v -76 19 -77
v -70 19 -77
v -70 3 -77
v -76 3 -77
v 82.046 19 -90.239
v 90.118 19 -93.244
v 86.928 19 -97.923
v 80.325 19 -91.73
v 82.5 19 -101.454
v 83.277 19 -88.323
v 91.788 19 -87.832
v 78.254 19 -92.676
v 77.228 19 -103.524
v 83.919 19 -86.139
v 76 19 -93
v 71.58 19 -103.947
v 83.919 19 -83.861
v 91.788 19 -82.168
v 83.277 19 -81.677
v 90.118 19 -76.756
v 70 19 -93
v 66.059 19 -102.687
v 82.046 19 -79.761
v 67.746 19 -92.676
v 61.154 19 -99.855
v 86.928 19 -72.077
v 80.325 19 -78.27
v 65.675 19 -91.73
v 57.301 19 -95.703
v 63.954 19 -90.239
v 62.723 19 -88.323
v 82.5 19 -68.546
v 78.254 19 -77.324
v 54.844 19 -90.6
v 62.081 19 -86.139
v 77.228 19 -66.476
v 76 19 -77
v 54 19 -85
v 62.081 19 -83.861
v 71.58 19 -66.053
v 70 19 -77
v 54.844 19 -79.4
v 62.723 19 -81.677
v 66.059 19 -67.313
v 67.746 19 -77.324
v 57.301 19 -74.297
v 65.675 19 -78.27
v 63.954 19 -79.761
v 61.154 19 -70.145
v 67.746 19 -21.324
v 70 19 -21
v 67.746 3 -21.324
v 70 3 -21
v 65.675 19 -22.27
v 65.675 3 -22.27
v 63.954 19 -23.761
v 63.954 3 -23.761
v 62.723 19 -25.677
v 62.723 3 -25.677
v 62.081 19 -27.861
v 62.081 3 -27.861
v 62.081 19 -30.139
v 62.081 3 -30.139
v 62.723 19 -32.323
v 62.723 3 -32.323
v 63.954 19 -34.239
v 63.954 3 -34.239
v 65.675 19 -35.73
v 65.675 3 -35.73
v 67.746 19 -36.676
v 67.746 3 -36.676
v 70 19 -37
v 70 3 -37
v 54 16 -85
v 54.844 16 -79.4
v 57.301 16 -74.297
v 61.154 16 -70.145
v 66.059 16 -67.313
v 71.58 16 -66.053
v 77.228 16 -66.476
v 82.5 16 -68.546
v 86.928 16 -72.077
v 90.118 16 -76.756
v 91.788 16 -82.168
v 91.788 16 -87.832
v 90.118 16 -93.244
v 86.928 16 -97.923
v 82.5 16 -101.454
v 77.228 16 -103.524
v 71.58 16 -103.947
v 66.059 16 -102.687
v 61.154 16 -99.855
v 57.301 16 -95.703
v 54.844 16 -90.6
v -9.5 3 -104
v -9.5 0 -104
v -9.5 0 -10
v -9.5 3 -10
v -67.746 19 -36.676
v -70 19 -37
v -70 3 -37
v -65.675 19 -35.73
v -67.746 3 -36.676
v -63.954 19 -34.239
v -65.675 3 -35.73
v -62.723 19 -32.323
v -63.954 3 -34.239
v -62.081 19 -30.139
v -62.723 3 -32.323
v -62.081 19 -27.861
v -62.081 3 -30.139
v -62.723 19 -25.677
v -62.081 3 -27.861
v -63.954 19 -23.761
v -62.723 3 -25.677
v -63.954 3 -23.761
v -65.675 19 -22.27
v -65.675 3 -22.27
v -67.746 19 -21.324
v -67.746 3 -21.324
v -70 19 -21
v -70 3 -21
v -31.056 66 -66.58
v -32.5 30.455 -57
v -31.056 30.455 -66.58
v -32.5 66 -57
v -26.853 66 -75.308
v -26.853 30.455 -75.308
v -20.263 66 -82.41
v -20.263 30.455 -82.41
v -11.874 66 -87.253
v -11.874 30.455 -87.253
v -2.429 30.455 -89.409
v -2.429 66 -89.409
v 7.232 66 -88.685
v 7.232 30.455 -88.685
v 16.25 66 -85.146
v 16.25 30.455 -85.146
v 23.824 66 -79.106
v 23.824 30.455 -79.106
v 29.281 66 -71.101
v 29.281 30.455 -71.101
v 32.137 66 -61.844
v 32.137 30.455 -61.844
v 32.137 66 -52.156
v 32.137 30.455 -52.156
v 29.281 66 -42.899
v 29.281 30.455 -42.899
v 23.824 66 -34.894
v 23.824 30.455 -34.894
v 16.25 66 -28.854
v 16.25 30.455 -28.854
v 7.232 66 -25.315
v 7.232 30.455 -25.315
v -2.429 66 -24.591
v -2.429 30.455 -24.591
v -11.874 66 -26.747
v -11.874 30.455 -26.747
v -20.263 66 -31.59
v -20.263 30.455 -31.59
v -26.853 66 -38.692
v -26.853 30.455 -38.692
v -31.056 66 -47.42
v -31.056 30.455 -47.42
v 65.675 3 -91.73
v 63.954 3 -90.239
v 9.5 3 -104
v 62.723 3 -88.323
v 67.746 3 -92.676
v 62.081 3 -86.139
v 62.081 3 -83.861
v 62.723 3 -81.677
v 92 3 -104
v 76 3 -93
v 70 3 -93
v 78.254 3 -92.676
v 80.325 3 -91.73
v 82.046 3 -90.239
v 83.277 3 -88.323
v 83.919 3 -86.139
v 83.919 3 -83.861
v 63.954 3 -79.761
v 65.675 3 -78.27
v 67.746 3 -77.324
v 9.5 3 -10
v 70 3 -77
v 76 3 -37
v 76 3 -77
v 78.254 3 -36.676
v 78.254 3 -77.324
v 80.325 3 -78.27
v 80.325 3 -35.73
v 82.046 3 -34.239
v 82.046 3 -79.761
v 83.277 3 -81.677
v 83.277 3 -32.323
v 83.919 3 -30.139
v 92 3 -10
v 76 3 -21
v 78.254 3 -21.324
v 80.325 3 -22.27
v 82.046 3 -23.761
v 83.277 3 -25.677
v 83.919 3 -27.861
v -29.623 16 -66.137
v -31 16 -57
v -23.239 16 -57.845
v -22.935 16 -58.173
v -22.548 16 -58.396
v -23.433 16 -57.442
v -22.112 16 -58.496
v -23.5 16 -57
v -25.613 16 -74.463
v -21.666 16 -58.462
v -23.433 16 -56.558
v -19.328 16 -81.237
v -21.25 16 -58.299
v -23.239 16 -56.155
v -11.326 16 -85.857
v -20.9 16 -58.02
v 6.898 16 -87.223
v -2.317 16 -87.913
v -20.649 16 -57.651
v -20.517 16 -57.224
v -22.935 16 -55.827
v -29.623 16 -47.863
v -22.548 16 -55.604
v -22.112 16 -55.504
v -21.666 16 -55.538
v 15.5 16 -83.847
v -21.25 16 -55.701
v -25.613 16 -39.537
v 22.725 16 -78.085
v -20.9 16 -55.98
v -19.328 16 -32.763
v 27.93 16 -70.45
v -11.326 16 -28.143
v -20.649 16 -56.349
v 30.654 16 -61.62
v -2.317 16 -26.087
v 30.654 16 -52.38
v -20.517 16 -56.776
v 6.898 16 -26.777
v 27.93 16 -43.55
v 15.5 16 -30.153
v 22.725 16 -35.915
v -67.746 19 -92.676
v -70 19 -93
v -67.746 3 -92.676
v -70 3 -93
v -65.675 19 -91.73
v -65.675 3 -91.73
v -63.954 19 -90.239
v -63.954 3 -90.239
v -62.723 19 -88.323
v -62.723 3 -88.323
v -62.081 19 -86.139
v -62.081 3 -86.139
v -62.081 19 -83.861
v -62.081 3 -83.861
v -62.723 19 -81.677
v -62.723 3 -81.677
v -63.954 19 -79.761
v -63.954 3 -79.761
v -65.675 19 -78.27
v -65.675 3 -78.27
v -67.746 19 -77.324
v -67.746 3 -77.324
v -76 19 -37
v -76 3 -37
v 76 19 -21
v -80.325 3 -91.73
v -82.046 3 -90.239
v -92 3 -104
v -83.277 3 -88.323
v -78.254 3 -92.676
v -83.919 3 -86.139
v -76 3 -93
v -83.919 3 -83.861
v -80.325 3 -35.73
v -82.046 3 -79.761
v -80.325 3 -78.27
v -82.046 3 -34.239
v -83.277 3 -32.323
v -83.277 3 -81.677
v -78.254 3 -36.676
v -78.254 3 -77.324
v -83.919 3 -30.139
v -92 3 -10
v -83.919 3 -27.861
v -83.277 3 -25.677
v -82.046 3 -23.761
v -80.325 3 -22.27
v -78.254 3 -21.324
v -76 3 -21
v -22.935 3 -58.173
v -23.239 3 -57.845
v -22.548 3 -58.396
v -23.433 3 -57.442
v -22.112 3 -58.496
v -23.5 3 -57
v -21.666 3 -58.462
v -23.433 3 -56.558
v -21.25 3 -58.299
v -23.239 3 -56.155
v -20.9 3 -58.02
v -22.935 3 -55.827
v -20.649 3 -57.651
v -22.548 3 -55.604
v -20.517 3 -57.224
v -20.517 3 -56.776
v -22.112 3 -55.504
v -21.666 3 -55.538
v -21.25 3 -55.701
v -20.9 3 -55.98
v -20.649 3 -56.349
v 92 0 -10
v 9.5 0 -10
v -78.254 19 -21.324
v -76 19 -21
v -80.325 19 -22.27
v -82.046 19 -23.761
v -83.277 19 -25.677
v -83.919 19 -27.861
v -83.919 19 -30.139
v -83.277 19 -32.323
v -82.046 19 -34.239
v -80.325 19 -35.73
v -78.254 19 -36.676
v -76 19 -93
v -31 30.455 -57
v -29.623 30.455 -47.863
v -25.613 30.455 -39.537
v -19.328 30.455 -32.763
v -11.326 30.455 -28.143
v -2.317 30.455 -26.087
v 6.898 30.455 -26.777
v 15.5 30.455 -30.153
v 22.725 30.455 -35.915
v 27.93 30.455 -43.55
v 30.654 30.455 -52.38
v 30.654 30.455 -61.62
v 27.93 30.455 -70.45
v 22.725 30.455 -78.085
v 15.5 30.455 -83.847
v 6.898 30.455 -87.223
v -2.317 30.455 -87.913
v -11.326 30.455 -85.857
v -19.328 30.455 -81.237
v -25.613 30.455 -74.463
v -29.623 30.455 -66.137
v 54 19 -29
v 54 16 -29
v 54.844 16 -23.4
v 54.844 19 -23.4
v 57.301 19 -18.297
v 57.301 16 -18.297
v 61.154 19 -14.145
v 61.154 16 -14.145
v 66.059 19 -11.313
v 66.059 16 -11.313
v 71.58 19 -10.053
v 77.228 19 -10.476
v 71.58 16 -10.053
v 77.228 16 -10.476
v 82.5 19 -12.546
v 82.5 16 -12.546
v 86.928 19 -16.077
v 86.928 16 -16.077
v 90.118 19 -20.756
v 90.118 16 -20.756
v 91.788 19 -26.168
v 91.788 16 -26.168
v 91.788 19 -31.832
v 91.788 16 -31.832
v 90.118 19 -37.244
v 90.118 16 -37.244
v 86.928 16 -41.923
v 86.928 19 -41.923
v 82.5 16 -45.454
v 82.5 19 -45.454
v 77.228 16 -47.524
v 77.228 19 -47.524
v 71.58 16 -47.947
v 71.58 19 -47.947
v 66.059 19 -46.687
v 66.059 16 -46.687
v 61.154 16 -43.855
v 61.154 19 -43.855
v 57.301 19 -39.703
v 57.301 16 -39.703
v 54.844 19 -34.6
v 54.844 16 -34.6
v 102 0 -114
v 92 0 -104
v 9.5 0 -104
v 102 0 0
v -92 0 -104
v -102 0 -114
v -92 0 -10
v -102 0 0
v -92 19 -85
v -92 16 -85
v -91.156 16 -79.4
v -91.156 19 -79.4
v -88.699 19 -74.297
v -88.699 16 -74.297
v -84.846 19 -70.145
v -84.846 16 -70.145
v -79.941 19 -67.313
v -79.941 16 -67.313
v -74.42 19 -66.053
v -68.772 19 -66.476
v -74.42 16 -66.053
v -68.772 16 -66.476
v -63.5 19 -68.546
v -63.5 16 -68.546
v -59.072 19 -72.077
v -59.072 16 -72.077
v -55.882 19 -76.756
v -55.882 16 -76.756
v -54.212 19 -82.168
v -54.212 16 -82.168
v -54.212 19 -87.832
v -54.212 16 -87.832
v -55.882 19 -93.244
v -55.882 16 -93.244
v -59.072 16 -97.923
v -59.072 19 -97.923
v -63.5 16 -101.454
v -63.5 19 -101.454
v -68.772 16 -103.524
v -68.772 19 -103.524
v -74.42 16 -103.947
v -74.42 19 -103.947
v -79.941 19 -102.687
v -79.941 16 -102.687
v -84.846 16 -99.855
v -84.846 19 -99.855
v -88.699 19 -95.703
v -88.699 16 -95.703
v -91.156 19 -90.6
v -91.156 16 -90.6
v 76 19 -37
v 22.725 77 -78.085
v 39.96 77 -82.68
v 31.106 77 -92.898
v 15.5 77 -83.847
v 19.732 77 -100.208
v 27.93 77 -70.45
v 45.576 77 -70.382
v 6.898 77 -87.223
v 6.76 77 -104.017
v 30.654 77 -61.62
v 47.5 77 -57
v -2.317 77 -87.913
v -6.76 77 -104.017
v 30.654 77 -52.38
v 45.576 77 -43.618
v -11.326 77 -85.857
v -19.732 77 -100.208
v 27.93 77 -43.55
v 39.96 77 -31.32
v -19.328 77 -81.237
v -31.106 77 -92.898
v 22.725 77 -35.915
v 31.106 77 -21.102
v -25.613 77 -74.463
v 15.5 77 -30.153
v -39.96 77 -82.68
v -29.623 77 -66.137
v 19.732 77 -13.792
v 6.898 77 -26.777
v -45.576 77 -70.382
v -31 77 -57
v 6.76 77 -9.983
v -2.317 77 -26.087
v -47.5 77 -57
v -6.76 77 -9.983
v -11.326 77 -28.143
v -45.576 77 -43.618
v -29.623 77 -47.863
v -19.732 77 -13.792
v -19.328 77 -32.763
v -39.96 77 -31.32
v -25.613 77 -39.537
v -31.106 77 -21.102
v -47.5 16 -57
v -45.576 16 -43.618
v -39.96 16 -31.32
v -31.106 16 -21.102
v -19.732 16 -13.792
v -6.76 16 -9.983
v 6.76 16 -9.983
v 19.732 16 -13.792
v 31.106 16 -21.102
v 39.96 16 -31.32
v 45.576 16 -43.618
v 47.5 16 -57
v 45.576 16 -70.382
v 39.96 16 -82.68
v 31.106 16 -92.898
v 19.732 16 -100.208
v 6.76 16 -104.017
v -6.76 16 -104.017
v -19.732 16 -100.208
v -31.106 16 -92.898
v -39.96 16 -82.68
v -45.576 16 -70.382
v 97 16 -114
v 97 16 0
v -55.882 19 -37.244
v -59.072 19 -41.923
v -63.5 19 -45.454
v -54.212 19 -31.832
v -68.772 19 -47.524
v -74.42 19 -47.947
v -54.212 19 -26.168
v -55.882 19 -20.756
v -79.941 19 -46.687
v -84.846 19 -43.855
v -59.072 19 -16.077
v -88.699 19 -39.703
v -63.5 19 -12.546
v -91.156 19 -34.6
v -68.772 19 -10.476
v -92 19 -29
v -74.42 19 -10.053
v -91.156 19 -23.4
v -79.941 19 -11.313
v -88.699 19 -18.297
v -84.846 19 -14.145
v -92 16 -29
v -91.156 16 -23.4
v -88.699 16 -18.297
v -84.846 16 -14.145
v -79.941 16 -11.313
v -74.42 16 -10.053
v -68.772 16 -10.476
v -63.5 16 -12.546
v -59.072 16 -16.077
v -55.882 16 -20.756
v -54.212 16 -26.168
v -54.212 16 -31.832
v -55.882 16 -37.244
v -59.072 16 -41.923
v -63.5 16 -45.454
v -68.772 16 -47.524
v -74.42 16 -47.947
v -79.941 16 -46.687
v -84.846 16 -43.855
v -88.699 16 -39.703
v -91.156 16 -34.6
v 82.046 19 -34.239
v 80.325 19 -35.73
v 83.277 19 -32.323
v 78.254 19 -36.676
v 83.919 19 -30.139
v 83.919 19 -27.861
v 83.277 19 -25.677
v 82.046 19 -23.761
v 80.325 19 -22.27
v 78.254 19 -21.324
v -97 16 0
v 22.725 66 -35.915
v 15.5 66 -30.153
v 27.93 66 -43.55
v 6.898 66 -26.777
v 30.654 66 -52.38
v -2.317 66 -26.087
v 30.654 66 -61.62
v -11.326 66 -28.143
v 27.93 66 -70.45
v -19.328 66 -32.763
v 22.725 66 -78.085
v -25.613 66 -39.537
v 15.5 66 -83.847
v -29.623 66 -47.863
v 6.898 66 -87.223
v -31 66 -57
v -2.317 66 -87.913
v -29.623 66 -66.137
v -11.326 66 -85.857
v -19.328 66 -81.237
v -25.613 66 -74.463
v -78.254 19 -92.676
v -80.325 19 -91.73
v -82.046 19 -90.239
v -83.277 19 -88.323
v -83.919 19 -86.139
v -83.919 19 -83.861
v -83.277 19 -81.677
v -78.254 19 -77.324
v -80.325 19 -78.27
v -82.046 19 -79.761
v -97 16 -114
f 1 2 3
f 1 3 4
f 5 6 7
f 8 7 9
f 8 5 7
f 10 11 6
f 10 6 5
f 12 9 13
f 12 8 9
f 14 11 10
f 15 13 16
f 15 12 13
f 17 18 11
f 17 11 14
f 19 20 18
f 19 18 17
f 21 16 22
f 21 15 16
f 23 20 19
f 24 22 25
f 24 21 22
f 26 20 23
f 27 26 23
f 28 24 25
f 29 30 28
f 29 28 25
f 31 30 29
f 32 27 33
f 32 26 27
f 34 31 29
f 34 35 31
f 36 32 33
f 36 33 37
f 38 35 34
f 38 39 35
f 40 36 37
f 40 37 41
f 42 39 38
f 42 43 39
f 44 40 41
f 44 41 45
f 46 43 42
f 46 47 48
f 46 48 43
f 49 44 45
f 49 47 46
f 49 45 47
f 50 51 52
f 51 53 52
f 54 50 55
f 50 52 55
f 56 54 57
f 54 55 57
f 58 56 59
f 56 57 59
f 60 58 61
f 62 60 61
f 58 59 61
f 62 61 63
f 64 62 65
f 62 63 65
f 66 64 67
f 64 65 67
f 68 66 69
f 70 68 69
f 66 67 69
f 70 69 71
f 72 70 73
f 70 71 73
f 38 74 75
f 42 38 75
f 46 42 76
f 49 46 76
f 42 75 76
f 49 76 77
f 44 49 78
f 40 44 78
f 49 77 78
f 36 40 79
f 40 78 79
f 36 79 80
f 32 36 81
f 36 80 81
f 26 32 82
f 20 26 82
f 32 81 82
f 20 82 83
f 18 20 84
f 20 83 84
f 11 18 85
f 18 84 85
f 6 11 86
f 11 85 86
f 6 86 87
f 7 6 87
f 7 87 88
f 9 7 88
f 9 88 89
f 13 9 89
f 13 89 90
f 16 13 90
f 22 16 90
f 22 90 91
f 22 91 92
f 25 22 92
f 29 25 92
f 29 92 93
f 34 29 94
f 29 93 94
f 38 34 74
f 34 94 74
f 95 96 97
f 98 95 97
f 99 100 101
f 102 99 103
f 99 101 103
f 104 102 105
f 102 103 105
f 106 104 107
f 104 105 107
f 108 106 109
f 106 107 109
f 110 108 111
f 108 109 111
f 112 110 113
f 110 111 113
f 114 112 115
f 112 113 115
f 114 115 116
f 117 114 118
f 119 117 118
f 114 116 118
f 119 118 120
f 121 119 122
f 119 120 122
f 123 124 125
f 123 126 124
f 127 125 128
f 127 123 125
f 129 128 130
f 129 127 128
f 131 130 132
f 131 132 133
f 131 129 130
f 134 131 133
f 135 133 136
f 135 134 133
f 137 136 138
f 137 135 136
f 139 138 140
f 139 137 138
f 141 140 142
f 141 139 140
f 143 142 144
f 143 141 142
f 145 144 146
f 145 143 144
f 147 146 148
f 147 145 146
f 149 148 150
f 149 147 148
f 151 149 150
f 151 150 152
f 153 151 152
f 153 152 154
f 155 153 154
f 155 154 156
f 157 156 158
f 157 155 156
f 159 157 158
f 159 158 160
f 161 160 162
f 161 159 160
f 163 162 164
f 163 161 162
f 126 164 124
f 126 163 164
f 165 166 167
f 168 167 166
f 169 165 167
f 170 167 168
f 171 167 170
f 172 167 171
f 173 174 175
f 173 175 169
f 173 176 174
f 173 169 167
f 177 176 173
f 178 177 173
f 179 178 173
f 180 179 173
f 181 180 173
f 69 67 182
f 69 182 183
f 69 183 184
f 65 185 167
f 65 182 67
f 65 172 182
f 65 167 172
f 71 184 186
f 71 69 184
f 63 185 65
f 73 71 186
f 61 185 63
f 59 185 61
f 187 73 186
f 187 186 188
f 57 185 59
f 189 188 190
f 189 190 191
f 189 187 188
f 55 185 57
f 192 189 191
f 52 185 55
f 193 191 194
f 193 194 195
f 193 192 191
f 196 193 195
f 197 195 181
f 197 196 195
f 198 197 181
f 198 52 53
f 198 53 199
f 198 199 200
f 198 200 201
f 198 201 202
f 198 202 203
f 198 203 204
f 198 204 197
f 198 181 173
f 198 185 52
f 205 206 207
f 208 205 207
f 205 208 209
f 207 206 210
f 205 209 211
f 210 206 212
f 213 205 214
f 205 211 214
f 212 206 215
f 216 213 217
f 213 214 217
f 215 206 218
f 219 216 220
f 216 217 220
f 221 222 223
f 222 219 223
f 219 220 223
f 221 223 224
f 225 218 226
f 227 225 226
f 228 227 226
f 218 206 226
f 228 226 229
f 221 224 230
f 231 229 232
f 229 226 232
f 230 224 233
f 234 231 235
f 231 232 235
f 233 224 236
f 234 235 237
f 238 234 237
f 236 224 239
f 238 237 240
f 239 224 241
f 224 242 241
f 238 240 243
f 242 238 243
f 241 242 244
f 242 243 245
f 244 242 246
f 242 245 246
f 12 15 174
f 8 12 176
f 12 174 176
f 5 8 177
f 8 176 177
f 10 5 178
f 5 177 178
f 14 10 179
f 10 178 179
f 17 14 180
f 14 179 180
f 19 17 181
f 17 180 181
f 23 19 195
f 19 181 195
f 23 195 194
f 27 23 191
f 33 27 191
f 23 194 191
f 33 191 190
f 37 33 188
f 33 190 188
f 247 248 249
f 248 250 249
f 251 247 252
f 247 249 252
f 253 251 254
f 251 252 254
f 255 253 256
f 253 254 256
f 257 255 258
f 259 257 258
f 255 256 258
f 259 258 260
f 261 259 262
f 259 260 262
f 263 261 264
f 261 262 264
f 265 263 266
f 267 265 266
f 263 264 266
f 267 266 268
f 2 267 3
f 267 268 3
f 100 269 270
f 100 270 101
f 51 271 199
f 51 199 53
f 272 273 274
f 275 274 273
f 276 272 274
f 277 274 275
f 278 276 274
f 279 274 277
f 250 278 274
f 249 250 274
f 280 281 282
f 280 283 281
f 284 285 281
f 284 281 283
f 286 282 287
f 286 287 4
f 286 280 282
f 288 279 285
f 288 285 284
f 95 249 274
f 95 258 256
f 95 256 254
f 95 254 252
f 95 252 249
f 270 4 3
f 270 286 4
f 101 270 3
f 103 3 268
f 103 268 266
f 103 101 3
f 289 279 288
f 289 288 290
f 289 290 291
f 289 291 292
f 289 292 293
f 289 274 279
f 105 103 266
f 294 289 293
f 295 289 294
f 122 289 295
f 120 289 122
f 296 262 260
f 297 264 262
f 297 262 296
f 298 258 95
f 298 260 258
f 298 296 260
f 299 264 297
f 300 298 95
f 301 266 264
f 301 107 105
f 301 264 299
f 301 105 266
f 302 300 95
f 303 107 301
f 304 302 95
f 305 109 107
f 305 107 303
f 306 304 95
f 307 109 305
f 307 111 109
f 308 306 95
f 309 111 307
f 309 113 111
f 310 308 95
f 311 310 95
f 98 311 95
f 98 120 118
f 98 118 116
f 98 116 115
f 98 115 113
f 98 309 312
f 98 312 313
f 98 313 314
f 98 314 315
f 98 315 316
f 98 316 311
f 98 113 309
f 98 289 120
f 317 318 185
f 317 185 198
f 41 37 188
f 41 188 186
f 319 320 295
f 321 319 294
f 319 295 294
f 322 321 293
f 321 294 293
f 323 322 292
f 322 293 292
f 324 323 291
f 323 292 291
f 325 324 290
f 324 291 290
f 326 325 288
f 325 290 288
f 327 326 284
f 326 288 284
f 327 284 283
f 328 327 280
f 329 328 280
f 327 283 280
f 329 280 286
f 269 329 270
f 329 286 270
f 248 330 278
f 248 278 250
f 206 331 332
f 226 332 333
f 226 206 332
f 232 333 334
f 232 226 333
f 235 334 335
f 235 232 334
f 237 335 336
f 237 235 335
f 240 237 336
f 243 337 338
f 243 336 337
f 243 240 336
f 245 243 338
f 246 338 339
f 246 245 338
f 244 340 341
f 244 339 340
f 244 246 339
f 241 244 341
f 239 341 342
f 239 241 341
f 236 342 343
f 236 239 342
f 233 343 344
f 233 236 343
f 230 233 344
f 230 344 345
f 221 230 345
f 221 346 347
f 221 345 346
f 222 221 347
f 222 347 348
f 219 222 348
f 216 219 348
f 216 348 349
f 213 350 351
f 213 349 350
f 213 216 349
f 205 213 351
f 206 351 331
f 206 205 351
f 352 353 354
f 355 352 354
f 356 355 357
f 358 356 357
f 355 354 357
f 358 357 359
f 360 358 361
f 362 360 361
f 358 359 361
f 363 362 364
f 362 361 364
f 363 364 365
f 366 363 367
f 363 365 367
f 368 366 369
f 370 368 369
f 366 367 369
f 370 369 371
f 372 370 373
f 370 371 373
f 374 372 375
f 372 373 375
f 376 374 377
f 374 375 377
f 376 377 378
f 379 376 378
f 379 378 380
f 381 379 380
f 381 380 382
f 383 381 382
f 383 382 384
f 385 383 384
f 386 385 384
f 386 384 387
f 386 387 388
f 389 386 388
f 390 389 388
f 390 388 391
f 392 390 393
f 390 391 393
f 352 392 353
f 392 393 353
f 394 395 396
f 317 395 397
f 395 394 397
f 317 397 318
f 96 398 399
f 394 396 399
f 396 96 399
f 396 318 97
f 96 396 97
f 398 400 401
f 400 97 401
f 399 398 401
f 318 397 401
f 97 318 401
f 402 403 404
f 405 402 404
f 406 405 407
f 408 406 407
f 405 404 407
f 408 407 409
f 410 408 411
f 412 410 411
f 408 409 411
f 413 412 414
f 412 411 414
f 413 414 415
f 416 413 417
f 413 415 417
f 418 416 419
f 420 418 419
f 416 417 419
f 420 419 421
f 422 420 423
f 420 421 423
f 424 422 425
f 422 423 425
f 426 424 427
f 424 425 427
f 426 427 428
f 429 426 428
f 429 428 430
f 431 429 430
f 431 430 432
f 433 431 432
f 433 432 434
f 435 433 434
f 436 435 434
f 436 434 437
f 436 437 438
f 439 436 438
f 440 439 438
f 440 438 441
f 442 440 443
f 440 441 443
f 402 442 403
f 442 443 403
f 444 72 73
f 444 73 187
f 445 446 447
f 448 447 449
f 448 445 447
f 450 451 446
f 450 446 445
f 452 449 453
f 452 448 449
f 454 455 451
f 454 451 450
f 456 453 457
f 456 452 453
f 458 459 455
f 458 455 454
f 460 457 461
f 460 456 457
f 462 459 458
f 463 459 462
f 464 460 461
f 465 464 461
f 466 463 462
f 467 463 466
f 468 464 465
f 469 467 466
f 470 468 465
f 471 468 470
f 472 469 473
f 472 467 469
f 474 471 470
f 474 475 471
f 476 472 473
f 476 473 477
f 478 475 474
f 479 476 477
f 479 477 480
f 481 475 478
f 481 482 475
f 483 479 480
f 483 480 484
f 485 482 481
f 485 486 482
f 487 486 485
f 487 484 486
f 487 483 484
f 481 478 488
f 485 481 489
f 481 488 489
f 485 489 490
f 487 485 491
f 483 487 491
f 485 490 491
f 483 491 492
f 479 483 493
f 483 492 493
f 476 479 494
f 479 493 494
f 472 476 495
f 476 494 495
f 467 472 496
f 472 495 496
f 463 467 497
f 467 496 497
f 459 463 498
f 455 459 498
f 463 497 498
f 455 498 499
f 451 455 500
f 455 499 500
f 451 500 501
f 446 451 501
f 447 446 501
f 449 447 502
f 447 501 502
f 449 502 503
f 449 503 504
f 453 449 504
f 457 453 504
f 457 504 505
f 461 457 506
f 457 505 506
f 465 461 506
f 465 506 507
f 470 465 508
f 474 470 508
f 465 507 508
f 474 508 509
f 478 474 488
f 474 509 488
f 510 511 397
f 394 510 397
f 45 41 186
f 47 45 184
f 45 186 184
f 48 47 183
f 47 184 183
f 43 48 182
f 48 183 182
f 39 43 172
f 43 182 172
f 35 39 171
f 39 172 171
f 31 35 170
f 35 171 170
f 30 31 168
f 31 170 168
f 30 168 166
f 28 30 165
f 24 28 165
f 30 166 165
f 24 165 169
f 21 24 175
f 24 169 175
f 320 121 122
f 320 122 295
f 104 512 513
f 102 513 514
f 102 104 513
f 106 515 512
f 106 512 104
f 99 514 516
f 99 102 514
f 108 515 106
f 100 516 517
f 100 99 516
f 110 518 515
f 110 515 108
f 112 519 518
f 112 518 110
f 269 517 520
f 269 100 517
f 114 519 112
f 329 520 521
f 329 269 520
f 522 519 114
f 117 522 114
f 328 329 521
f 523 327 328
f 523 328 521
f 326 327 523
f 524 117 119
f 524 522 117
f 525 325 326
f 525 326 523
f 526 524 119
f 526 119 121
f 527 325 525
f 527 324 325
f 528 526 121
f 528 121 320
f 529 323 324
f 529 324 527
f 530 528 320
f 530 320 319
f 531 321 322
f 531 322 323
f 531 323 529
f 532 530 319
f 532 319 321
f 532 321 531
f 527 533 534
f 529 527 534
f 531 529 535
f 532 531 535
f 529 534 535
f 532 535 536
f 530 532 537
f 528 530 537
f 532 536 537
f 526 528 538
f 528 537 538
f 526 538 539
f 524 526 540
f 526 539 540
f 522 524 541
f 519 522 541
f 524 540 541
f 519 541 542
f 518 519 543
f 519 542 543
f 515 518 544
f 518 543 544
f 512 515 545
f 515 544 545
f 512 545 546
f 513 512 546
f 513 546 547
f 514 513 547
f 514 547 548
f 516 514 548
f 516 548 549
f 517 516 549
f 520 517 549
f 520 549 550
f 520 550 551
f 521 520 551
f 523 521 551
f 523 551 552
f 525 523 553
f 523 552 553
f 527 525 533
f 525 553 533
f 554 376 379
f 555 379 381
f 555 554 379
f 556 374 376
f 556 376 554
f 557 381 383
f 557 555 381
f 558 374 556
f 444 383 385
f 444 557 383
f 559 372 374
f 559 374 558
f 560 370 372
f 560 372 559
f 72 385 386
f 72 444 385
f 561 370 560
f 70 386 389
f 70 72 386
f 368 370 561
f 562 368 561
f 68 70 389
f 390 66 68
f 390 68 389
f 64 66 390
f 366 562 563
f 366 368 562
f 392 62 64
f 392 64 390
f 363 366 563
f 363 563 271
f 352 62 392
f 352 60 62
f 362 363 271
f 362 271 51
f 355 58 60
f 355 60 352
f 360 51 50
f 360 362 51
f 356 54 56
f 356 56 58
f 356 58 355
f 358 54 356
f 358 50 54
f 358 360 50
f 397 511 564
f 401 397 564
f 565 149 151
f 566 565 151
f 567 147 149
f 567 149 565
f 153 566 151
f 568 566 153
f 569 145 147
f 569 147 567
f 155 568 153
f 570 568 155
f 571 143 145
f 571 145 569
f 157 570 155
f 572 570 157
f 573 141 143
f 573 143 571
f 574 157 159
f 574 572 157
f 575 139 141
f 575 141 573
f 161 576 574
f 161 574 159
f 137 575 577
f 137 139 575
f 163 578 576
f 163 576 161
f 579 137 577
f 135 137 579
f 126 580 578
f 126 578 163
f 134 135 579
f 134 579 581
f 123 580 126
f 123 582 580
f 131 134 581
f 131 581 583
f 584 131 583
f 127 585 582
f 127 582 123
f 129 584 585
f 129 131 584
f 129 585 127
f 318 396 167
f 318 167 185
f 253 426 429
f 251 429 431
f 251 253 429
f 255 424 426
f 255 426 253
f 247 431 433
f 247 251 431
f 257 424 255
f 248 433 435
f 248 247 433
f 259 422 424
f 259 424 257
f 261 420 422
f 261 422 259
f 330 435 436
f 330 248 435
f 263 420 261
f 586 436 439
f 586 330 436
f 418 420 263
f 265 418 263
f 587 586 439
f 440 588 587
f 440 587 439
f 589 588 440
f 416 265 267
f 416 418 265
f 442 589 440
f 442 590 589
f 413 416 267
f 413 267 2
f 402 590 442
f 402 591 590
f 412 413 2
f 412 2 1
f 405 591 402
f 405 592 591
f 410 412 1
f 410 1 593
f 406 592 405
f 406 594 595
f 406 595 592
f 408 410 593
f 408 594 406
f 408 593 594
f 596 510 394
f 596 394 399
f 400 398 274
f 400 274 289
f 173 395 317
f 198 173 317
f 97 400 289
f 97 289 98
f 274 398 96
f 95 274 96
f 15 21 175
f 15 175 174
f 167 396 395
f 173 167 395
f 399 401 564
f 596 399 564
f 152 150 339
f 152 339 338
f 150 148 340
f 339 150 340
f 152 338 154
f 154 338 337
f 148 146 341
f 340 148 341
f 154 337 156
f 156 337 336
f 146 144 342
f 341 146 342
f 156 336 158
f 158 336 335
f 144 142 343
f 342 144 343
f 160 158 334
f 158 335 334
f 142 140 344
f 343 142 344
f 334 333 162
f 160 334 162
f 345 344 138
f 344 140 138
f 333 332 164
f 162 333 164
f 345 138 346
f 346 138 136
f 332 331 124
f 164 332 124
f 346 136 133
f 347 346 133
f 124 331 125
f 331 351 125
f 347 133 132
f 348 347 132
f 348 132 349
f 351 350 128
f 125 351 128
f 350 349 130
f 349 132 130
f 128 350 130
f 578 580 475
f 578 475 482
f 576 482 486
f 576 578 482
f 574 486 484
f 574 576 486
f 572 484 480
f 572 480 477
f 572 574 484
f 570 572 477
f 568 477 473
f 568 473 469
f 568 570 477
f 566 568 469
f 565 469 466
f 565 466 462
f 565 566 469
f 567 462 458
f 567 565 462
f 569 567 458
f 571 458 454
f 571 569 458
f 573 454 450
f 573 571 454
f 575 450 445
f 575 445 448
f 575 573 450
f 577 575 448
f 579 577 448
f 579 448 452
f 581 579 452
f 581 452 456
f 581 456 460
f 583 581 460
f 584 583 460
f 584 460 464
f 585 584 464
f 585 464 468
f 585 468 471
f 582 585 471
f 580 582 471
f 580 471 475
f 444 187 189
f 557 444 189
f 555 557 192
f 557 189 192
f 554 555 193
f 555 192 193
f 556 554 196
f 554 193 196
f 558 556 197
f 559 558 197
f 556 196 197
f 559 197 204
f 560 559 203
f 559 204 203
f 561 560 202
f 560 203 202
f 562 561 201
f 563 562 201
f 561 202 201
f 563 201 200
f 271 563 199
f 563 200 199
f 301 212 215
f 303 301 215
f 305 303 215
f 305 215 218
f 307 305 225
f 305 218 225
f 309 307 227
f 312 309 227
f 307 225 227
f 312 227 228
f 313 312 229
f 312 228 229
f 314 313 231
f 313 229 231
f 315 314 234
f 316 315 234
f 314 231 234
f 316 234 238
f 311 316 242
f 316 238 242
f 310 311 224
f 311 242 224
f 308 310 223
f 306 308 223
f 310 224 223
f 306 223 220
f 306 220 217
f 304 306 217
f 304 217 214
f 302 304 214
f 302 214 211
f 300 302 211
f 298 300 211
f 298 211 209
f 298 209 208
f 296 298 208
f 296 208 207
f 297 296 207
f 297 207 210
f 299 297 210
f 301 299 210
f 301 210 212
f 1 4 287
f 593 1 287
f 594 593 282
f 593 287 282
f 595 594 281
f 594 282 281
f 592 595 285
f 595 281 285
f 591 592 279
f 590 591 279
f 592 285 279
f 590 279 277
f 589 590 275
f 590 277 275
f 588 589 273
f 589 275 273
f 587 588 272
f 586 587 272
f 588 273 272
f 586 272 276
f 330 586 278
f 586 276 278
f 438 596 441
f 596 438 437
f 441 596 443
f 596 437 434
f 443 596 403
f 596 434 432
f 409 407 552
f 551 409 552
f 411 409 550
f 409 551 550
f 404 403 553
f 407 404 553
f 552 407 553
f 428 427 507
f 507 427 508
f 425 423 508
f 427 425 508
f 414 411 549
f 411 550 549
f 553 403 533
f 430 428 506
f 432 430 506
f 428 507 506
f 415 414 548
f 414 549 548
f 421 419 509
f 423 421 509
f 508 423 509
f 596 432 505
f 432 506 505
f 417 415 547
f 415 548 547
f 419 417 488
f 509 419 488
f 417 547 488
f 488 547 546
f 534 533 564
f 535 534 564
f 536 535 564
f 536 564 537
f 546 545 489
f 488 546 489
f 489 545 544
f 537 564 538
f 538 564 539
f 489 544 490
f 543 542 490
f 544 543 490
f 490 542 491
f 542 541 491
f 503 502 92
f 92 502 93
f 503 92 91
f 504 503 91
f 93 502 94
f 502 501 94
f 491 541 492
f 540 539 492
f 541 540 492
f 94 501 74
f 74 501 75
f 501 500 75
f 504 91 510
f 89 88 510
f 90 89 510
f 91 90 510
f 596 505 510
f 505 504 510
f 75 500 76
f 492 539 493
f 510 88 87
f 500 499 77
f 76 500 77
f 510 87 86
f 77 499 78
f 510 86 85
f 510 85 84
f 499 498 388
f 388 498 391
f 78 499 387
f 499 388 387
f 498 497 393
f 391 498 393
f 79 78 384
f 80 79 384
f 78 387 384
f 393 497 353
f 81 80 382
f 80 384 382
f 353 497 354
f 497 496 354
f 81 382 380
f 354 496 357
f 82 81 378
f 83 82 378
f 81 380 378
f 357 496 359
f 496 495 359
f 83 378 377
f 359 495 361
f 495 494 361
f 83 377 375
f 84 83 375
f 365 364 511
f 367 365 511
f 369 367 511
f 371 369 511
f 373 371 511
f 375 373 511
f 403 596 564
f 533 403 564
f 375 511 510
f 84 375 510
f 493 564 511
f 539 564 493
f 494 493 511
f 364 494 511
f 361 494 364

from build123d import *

# Parameters (mm, degrees)
BOSS_EXTRUDE1_DEPTH = 114
SKETCH3_W           = 82.5
SKETCH3_H           = 94
CUT_EXTRUDE1_DEPTH  = 3
CUT_EXTRUDE2_DEPTH  = 17
SKETCH5_R           = 19
BOSS_EXTRUDE2_DEPTH = 3
SKETCH6_R           = 47.5
SKETCH6_R_2         = 31
BOSS_EXTRUDE4_DEPTH = 61
SKETCH8_W           = 3
SKETCH8_H           = 35.544994967
SKETCH9_R           = 1.5
CUT_EXTRUDE3_DEPTH  = 22


with BuildPart() as part:
    # Sketch2 → Boss-Extrude1 (new body)
    with BuildSketch(Plane.XY):
        Polygon((-102, 0), (-97, 16), (97, 16), (102, 0), align=None)
    extrude(amount=-BOSS_EXTRUDE1_DEPTH)

    # Sketch3 → Cut-Extrude1 (cut)
    with BuildSketch(Plane.XZ):
        with Locations((-50.75, -57)):
            Rectangle(SKETCH3_W, SKETCH3_H)
        with Locations((50.75, -57)):
            Rectangle(SKETCH3_W, SKETCH3_H)
    extrude(amount=-CUT_EXTRUDE1_DEPTH, mode=Mode.SUBTRACT)

    # Sketch4 → Cut-Extrude2 (cut, through all)
    with BuildSketch(Plane(origin=(0, 16, 0), x_dir=(1, 0, 0), z_dir=(0, 1, 0))):
        with BuildLine():
            Line((-76, 77), (-70, 77))
            ThreePointArc((-70, 77), (-62, 85), (-70, 93))
            Line((-70, 93), (-76, 93))
            ThreePointArc((-76, 93), (-84, 85), (-76, 77))
        make_face()
        with BuildLine():
            ThreePointArc((70, 77), (62, 85), (70, 93))
            Line((70, 93), (76, 93))
            ThreePointArc((76, 93), (84, 85), (76, 77))
            Line((76, 77), (70, 77))
        make_face()
        with BuildLine():
            ThreePointArc((-70, 37), (-62, 29), (-70, 21))
            Line((-70, 21), (-76, 21))
            ThreePointArc((-76, 21), (-84, 29), (-76, 37))
            Line((-76, 37), (-70, 37))
        make_face()
        with BuildLine():
            Line((76, 37), (70, 37))
            ThreePointArc((70, 37), (62, 29), (70, 21))
            Line((70, 21), (76, 21))
            ThreePointArc((76, 21), (84, 29), (76, 37))
        make_face()
    extrude(amount=-CUT_EXTRUDE2_DEPTH, mode=Mode.SUBTRACT)

    # Sketch5 → Boss-Extrude2 (add)
    with BuildSketch(Plane(origin=(0, 16, 0), x_dir=(1, 0, 0), z_dir=(0, 1, 0))):
        with Locations(Location((-73, 85, 0), (0, 0, 180))):  # turned: the seam where the file's is
            Circle(SKETCH5_R)
        with BuildLine():
            ThreePointArc((-70, 93), (-62, 85), (-70, 77))
            Line((-70, 77), (-76, 77))
            ThreePointArc((-76, 77), (-84, 85), (-76, 93))
            Line((-76, 93), (-70, 93))
        make_face(mode=Mode.SUBTRACT)
        with Locations(Location((73, 85, 0), (0, 0, 180))):  # turned: the seam where the file's is
            Circle(SKETCH5_R)
        with BuildLine():
            ThreePointArc((76, 93), (84, 85), (76, 77))
            Line((76, 77), (70, 77))
            ThreePointArc((70, 77), (62, 85), (70, 93))
            Line((70, 93), (76, 93))
        make_face(mode=Mode.SUBTRACT)
        with Locations(Location((73, 29, 0), (0, 0, 180))):  # turned: the seam where the file's is
            Circle(SKETCH5_R)
        with BuildLine():
            ThreePointArc((70, 21), (62, 29), (70, 37))
            Line((70, 37), (76, 37))
            ThreePointArc((76, 37), (84, 29), (76, 21))
            Line((76, 21), (70, 21))
        make_face(mode=Mode.SUBTRACT)
        with Locations(Location((-73, 29, 0), (0, 0, 180))):  # turned: the seam where the file's is
            Circle(SKETCH5_R)
        with BuildLine():
            ThreePointArc((-76, 21), (-84, 29), (-76, 37))
            Line((-76, 37), (-70, 37))
            ThreePointArc((-70, 37), (-62, 29), (-70, 21))
            Line((-70, 21), (-76, 21))
        make_face(mode=Mode.SUBTRACT)
    extrude(amount=BOSS_EXTRUDE2_DEPTH)

    # Sketch6 → Boss-Extrude4 (add)
    with BuildSketch(Plane(origin=(0, 16, 0), x_dir=(1, 0, 0), z_dir=(0, 1, 0))):
        with Locations(Location((0, 57, 0), (0, 0, 180))):  # turned: the seam where the file's is
            Circle(SKETCH6_R)
        with Locations(Location((0, 57, 0), (0, 0, 180))):  # turned: the seam where the file's is
            Circle(SKETCH6_R_2, mode=Mode.SUBTRACT)
    extrude(amount=BOSS_EXTRUDE4_DEPTH)

    # Sketch8 → Cut-Revolve1 (revolve, cut)
    with BuildSketch(Plane.XY.offset(-57)):
        with Locations((-31, 48.227502517)):
            Rectangle(SKETCH8_W, SKETCH8_H)
    revolve(axis=Axis((0, 107.106199385, -57), (0, -1, 0)), mode=Mode.SUBTRACT)

    # Sketch9 → Cut-Extrude3 (cut)
    with BuildSketch(Plane(origin=(0, 16, 0), x_dir=(1, 0, 0), z_dir=(0, 1, 0))):
        with Locations(Location((-22, 57, 0), (0, 0, 180))):  # turned: the seam where the file's is
            Circle(SKETCH9_R)
    extrude(amount=-CUT_EXTRUDE3_DEPTH, mode=Mode.SUBTRACT)


solid = part.part
